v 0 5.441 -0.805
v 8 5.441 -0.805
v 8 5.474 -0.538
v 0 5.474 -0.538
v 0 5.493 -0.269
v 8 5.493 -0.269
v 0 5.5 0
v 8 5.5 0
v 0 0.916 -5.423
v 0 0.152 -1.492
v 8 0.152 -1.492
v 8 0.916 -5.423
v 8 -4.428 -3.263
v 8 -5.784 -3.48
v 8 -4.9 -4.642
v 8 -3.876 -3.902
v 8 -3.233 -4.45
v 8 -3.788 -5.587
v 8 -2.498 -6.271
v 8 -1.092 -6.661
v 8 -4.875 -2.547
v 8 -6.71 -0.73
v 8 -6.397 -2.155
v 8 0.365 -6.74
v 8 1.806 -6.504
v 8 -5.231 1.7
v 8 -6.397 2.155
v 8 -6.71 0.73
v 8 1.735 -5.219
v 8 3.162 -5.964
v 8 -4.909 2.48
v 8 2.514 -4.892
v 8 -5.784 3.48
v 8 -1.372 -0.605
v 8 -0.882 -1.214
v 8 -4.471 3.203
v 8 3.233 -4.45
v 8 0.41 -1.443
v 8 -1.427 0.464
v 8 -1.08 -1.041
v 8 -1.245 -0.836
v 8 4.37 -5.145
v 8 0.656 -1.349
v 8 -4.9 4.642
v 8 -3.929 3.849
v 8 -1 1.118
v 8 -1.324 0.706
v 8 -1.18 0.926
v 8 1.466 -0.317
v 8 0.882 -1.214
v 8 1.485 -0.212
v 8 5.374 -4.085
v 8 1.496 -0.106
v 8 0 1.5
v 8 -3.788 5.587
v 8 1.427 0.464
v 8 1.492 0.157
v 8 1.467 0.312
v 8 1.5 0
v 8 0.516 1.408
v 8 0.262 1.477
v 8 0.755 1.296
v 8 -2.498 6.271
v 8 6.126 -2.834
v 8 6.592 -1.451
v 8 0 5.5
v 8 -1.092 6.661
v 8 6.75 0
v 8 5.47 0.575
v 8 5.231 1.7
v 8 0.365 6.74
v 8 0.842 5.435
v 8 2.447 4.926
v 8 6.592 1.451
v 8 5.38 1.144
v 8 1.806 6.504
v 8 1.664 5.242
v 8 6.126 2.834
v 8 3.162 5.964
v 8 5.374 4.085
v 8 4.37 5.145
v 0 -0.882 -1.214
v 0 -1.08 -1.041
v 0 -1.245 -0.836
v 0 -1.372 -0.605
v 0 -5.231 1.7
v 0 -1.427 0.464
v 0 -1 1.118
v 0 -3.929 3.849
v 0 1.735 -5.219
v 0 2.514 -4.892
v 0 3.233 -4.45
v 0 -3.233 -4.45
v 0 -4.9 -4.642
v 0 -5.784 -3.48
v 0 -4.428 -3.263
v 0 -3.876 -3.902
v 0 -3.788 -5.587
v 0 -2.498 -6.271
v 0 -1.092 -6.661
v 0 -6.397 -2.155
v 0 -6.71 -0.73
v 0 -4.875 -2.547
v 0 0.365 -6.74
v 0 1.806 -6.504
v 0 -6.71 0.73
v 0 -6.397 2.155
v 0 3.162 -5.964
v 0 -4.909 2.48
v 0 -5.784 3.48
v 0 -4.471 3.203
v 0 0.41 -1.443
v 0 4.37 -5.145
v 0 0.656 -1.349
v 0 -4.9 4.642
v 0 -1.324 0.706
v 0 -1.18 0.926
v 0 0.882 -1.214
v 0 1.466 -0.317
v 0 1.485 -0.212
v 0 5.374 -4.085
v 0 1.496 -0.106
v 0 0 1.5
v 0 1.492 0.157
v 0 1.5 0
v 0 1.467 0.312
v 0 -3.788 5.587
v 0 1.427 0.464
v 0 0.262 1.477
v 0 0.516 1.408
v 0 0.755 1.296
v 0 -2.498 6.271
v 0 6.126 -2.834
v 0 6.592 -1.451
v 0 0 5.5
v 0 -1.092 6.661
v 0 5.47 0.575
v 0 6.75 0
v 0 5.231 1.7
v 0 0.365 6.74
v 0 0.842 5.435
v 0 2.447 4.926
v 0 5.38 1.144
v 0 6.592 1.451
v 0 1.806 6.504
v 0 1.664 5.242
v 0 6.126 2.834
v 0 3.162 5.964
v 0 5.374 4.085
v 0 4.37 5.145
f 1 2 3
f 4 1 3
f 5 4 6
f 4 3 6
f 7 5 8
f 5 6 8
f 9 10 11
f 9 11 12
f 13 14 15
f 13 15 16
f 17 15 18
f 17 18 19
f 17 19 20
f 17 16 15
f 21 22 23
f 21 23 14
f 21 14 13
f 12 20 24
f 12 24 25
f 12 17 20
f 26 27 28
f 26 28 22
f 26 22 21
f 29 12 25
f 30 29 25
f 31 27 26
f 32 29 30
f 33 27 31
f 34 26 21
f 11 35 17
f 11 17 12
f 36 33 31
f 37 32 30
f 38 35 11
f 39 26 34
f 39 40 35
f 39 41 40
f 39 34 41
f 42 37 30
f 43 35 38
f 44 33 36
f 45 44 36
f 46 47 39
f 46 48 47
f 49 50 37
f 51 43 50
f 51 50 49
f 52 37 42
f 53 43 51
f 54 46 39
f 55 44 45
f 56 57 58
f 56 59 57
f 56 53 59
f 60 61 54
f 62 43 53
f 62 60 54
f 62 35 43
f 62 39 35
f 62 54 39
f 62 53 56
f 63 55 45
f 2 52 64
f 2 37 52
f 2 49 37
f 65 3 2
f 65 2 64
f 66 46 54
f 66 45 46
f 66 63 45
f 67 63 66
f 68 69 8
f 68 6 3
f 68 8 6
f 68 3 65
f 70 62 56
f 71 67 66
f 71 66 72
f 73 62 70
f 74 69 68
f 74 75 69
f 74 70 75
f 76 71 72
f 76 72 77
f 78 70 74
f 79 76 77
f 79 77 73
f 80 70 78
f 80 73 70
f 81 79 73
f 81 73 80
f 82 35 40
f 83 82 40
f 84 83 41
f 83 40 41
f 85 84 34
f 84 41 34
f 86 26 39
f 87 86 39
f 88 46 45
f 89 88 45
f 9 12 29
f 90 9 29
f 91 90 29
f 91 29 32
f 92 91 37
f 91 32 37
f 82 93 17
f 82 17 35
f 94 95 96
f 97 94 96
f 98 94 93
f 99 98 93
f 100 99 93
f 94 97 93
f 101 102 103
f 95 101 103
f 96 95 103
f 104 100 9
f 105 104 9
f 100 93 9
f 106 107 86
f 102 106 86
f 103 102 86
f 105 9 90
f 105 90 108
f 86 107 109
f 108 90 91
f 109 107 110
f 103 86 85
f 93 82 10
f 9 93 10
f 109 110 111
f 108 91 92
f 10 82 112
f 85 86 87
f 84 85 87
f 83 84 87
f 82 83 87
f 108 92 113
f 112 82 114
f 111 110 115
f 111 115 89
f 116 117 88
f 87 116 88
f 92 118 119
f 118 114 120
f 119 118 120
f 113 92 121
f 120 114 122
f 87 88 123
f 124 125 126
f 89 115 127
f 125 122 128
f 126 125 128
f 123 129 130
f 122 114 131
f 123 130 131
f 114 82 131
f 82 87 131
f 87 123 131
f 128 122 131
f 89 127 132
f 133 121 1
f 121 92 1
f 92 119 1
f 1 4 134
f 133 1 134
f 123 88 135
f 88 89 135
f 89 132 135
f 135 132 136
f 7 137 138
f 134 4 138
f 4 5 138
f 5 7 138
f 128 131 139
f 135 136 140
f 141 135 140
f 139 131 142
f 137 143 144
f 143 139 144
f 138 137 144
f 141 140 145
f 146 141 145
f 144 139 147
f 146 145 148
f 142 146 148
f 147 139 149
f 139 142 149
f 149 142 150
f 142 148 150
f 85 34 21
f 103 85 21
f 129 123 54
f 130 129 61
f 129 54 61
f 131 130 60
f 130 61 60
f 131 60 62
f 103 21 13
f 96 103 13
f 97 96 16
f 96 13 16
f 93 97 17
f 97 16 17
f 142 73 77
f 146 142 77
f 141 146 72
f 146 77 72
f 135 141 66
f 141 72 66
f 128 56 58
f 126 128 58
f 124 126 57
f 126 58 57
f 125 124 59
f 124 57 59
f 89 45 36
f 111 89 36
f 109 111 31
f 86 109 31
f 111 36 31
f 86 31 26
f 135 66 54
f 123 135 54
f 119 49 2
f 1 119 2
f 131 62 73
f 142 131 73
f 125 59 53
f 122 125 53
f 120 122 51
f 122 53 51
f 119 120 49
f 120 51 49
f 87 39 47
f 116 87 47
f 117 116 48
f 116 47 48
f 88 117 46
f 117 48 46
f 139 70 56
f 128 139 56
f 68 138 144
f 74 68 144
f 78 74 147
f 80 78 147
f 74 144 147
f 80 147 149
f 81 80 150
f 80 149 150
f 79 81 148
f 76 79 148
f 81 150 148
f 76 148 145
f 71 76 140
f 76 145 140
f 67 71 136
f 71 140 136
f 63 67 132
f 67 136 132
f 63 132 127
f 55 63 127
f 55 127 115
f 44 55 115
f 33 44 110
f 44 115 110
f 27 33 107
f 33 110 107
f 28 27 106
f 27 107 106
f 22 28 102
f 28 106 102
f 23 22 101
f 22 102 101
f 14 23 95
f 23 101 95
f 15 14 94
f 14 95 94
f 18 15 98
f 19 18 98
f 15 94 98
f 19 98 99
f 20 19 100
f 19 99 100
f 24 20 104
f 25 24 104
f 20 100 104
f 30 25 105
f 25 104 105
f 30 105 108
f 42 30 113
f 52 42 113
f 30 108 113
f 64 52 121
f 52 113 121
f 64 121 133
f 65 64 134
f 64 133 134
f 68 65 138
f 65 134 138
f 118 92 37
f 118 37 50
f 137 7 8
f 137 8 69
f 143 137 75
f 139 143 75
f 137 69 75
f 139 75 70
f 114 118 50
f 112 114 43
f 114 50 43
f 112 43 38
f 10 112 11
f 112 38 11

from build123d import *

# Parameters (mm, degrees)
F0_R     = 6.75
F1_DEPTH = 8
F3_DEPTH = 8.001


with BuildPart() as f1:
    # F0 (on Right) → F1 (new body)
    with BuildSketch(Plane.YZ):
        Circle(F0_R)
    extrude(amount=F1_DEPTH)

    # F2 (on face) → F3 (cut, through all)
    with BuildSketch(Plane.YZ.offset(8)):
        with BuildLine():
            ThreePointArc((-1.426585, 0.463525), (-1.256585, 0.819143), (-0.999817, 1.118198))
            Line((-0.999817, 1.118198), (-3.928516, 3.849254))
            ThreePointArc((-3.928516, 3.849254), (-4.704102, 2.849811), (-5.230811, 1.699593))
            Line((-5.230811, 1.699593), (-1.426585, 0.463525))
        make_face()
        with BuildLine():
            Line((-3.232819, -4.449593), (-0.881678, -1.213525))
            ThreePointArc((-0.881678, -1.213525), (-1.167357, -0.941954), (-1.37243, -0.60534))
            Line((-1.37243, -0.60534), (-4.874837, -2.546756))
            ThreePointArc((-4.874837, -2.546756), (-4.163979, -3.593227), (-3.232819, -4.449593))
        make_face()
        with BuildLine():
            ThreePointArc((0, 1.5), (0.390745, 1.448212), (0.754509, 1.296424))
            Line((0.754509, 1.296424), (2.44688, 4.925726))
            ThreePointArc((2.44688, 4.925726), (1.256683, 5.354507), (0, 5.5))
            Line((0, 5.5), (0, 1.5))
        make_face()
        with BuildLine():
            Line((3.232819, -4.449593), (0.881678, -1.213525))
            ThreePointArc((0.881678, -1.213525), (0.535118, -1.401302), (0.151609, -1.492319))
            Line((0.151609, -1.492319), (0.915702, -5.423236))
            ThreePointArc((0.915702, -5.423236), (2.130622, -5.070547), (3.232819, -4.449593))
        make_face()
        with BuildLine():
            ThreePointArc((1.426585, 0.463525), (1.481533, 0.234652), (1.5, 0))
            ThreePointArc((1.5, 0), (1.491508, -0.159384), (1.466129, -0.316964))
            Line((1.466129, -0.316964), (5.440771, -0.804988))
            ThreePointArc((5.440771, -0.804988), (5.485173, -0.403582), (5.5, 0))
            ThreePointArc((5.5, 0), (5.432286, 0.86039), (5.230811, 1.699593))
            Line((5.230811, 1.699593), (1.426585, 0.463525))
        make_face()
    extrude(amount=-F3_DEPTH, mode=Mode.SUBTRACT)


solid = f1.part
